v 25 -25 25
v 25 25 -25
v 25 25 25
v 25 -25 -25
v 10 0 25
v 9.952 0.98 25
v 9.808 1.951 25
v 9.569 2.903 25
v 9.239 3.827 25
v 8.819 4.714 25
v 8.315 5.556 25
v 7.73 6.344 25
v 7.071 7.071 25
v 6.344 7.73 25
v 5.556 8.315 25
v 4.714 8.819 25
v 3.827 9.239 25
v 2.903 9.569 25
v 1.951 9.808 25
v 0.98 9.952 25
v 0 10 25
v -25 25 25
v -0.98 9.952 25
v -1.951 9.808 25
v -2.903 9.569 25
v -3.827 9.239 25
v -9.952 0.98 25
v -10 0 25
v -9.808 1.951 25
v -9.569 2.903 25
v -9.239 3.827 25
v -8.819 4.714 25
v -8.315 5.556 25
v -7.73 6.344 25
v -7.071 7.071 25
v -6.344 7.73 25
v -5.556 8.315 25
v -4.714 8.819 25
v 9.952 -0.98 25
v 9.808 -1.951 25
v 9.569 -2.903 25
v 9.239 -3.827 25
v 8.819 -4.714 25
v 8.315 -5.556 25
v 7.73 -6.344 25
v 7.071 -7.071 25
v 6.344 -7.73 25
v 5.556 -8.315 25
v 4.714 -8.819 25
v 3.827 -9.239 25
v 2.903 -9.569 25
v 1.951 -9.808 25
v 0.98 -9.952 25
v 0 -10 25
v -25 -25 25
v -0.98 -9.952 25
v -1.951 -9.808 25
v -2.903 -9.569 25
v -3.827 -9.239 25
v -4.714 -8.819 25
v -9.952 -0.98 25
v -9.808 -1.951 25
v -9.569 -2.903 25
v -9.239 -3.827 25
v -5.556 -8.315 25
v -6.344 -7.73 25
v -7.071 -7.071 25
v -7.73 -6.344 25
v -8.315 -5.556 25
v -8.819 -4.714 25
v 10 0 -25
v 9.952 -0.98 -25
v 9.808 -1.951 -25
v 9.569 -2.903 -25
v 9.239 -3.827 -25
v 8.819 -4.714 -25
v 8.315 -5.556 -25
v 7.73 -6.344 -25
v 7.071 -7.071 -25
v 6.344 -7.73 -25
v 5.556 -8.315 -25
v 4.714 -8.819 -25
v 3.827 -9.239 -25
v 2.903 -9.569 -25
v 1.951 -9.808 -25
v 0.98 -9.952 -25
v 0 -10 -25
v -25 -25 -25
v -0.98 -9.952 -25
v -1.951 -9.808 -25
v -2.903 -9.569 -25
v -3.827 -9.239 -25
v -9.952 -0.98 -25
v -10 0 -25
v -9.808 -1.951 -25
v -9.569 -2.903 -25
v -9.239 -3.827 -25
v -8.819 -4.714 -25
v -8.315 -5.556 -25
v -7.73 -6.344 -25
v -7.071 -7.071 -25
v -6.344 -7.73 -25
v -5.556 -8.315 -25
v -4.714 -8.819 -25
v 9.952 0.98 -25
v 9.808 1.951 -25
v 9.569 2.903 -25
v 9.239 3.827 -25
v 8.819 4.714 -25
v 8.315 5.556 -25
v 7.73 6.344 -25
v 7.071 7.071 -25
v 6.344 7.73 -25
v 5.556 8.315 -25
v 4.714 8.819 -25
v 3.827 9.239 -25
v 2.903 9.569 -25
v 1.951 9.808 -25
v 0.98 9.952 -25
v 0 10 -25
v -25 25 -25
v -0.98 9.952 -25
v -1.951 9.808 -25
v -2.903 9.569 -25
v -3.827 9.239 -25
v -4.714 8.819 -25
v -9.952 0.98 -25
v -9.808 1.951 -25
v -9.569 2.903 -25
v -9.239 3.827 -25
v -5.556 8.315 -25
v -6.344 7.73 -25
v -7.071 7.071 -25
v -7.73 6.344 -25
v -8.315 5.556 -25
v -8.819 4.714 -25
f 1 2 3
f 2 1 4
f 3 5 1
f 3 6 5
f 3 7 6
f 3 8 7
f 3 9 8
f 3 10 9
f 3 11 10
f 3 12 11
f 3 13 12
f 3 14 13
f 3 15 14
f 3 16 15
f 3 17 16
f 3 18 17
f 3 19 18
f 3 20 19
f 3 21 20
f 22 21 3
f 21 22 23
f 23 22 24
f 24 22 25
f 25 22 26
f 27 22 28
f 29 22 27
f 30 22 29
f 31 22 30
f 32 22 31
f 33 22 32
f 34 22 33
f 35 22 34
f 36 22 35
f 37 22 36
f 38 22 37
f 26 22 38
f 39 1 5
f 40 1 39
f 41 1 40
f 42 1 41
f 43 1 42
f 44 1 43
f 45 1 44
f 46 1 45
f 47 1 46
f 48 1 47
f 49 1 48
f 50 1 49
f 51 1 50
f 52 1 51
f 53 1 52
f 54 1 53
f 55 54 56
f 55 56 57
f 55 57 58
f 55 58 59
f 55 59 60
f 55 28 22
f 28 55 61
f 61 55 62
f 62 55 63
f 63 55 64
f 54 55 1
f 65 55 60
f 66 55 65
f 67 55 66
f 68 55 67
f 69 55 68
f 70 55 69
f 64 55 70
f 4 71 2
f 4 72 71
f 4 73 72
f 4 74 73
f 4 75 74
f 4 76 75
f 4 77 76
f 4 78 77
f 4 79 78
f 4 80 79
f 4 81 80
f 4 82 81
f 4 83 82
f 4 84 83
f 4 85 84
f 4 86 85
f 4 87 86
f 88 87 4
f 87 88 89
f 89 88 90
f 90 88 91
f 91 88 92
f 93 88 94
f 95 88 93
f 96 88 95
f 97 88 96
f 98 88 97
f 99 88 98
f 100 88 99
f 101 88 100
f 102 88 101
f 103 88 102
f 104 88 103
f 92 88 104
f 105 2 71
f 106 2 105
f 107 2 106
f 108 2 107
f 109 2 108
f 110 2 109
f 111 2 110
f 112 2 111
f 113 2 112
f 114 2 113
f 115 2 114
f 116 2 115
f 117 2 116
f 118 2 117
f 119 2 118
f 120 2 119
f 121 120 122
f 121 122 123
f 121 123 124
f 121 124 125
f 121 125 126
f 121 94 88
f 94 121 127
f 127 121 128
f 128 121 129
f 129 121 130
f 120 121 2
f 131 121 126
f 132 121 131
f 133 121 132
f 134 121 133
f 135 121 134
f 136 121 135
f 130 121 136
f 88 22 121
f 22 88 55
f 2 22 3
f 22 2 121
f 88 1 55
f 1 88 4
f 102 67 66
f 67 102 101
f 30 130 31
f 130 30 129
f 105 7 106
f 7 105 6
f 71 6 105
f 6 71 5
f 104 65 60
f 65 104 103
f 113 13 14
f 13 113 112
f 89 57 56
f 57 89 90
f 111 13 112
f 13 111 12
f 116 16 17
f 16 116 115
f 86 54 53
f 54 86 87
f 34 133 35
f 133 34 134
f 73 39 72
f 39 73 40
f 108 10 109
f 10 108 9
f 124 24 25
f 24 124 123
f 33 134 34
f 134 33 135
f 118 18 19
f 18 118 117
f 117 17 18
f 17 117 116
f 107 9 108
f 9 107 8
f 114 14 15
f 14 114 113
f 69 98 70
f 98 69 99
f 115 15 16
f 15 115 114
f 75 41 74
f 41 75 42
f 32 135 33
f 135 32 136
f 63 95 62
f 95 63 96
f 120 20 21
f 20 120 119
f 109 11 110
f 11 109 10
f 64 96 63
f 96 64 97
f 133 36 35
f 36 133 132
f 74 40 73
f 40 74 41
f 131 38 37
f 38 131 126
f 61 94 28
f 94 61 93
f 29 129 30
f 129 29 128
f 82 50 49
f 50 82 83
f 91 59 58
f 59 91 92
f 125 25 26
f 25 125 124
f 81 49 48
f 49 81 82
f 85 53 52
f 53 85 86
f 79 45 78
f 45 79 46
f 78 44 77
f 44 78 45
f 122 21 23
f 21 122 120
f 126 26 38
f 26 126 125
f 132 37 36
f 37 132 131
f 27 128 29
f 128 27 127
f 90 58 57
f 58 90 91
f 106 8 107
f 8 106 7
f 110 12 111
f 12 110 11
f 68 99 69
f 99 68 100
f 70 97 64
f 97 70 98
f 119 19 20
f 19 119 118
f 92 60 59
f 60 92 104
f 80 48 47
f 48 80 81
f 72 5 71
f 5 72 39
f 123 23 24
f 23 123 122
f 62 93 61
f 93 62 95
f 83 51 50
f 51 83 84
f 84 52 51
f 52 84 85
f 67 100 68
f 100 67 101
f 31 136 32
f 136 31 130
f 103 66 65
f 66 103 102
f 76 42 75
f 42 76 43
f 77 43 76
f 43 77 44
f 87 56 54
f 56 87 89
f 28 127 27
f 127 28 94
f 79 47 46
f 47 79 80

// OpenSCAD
difference() {
    cube([50, 50, 50], center = true);
    cylinder(h = 51, d = 20, center = true, $fn = 64);
}
